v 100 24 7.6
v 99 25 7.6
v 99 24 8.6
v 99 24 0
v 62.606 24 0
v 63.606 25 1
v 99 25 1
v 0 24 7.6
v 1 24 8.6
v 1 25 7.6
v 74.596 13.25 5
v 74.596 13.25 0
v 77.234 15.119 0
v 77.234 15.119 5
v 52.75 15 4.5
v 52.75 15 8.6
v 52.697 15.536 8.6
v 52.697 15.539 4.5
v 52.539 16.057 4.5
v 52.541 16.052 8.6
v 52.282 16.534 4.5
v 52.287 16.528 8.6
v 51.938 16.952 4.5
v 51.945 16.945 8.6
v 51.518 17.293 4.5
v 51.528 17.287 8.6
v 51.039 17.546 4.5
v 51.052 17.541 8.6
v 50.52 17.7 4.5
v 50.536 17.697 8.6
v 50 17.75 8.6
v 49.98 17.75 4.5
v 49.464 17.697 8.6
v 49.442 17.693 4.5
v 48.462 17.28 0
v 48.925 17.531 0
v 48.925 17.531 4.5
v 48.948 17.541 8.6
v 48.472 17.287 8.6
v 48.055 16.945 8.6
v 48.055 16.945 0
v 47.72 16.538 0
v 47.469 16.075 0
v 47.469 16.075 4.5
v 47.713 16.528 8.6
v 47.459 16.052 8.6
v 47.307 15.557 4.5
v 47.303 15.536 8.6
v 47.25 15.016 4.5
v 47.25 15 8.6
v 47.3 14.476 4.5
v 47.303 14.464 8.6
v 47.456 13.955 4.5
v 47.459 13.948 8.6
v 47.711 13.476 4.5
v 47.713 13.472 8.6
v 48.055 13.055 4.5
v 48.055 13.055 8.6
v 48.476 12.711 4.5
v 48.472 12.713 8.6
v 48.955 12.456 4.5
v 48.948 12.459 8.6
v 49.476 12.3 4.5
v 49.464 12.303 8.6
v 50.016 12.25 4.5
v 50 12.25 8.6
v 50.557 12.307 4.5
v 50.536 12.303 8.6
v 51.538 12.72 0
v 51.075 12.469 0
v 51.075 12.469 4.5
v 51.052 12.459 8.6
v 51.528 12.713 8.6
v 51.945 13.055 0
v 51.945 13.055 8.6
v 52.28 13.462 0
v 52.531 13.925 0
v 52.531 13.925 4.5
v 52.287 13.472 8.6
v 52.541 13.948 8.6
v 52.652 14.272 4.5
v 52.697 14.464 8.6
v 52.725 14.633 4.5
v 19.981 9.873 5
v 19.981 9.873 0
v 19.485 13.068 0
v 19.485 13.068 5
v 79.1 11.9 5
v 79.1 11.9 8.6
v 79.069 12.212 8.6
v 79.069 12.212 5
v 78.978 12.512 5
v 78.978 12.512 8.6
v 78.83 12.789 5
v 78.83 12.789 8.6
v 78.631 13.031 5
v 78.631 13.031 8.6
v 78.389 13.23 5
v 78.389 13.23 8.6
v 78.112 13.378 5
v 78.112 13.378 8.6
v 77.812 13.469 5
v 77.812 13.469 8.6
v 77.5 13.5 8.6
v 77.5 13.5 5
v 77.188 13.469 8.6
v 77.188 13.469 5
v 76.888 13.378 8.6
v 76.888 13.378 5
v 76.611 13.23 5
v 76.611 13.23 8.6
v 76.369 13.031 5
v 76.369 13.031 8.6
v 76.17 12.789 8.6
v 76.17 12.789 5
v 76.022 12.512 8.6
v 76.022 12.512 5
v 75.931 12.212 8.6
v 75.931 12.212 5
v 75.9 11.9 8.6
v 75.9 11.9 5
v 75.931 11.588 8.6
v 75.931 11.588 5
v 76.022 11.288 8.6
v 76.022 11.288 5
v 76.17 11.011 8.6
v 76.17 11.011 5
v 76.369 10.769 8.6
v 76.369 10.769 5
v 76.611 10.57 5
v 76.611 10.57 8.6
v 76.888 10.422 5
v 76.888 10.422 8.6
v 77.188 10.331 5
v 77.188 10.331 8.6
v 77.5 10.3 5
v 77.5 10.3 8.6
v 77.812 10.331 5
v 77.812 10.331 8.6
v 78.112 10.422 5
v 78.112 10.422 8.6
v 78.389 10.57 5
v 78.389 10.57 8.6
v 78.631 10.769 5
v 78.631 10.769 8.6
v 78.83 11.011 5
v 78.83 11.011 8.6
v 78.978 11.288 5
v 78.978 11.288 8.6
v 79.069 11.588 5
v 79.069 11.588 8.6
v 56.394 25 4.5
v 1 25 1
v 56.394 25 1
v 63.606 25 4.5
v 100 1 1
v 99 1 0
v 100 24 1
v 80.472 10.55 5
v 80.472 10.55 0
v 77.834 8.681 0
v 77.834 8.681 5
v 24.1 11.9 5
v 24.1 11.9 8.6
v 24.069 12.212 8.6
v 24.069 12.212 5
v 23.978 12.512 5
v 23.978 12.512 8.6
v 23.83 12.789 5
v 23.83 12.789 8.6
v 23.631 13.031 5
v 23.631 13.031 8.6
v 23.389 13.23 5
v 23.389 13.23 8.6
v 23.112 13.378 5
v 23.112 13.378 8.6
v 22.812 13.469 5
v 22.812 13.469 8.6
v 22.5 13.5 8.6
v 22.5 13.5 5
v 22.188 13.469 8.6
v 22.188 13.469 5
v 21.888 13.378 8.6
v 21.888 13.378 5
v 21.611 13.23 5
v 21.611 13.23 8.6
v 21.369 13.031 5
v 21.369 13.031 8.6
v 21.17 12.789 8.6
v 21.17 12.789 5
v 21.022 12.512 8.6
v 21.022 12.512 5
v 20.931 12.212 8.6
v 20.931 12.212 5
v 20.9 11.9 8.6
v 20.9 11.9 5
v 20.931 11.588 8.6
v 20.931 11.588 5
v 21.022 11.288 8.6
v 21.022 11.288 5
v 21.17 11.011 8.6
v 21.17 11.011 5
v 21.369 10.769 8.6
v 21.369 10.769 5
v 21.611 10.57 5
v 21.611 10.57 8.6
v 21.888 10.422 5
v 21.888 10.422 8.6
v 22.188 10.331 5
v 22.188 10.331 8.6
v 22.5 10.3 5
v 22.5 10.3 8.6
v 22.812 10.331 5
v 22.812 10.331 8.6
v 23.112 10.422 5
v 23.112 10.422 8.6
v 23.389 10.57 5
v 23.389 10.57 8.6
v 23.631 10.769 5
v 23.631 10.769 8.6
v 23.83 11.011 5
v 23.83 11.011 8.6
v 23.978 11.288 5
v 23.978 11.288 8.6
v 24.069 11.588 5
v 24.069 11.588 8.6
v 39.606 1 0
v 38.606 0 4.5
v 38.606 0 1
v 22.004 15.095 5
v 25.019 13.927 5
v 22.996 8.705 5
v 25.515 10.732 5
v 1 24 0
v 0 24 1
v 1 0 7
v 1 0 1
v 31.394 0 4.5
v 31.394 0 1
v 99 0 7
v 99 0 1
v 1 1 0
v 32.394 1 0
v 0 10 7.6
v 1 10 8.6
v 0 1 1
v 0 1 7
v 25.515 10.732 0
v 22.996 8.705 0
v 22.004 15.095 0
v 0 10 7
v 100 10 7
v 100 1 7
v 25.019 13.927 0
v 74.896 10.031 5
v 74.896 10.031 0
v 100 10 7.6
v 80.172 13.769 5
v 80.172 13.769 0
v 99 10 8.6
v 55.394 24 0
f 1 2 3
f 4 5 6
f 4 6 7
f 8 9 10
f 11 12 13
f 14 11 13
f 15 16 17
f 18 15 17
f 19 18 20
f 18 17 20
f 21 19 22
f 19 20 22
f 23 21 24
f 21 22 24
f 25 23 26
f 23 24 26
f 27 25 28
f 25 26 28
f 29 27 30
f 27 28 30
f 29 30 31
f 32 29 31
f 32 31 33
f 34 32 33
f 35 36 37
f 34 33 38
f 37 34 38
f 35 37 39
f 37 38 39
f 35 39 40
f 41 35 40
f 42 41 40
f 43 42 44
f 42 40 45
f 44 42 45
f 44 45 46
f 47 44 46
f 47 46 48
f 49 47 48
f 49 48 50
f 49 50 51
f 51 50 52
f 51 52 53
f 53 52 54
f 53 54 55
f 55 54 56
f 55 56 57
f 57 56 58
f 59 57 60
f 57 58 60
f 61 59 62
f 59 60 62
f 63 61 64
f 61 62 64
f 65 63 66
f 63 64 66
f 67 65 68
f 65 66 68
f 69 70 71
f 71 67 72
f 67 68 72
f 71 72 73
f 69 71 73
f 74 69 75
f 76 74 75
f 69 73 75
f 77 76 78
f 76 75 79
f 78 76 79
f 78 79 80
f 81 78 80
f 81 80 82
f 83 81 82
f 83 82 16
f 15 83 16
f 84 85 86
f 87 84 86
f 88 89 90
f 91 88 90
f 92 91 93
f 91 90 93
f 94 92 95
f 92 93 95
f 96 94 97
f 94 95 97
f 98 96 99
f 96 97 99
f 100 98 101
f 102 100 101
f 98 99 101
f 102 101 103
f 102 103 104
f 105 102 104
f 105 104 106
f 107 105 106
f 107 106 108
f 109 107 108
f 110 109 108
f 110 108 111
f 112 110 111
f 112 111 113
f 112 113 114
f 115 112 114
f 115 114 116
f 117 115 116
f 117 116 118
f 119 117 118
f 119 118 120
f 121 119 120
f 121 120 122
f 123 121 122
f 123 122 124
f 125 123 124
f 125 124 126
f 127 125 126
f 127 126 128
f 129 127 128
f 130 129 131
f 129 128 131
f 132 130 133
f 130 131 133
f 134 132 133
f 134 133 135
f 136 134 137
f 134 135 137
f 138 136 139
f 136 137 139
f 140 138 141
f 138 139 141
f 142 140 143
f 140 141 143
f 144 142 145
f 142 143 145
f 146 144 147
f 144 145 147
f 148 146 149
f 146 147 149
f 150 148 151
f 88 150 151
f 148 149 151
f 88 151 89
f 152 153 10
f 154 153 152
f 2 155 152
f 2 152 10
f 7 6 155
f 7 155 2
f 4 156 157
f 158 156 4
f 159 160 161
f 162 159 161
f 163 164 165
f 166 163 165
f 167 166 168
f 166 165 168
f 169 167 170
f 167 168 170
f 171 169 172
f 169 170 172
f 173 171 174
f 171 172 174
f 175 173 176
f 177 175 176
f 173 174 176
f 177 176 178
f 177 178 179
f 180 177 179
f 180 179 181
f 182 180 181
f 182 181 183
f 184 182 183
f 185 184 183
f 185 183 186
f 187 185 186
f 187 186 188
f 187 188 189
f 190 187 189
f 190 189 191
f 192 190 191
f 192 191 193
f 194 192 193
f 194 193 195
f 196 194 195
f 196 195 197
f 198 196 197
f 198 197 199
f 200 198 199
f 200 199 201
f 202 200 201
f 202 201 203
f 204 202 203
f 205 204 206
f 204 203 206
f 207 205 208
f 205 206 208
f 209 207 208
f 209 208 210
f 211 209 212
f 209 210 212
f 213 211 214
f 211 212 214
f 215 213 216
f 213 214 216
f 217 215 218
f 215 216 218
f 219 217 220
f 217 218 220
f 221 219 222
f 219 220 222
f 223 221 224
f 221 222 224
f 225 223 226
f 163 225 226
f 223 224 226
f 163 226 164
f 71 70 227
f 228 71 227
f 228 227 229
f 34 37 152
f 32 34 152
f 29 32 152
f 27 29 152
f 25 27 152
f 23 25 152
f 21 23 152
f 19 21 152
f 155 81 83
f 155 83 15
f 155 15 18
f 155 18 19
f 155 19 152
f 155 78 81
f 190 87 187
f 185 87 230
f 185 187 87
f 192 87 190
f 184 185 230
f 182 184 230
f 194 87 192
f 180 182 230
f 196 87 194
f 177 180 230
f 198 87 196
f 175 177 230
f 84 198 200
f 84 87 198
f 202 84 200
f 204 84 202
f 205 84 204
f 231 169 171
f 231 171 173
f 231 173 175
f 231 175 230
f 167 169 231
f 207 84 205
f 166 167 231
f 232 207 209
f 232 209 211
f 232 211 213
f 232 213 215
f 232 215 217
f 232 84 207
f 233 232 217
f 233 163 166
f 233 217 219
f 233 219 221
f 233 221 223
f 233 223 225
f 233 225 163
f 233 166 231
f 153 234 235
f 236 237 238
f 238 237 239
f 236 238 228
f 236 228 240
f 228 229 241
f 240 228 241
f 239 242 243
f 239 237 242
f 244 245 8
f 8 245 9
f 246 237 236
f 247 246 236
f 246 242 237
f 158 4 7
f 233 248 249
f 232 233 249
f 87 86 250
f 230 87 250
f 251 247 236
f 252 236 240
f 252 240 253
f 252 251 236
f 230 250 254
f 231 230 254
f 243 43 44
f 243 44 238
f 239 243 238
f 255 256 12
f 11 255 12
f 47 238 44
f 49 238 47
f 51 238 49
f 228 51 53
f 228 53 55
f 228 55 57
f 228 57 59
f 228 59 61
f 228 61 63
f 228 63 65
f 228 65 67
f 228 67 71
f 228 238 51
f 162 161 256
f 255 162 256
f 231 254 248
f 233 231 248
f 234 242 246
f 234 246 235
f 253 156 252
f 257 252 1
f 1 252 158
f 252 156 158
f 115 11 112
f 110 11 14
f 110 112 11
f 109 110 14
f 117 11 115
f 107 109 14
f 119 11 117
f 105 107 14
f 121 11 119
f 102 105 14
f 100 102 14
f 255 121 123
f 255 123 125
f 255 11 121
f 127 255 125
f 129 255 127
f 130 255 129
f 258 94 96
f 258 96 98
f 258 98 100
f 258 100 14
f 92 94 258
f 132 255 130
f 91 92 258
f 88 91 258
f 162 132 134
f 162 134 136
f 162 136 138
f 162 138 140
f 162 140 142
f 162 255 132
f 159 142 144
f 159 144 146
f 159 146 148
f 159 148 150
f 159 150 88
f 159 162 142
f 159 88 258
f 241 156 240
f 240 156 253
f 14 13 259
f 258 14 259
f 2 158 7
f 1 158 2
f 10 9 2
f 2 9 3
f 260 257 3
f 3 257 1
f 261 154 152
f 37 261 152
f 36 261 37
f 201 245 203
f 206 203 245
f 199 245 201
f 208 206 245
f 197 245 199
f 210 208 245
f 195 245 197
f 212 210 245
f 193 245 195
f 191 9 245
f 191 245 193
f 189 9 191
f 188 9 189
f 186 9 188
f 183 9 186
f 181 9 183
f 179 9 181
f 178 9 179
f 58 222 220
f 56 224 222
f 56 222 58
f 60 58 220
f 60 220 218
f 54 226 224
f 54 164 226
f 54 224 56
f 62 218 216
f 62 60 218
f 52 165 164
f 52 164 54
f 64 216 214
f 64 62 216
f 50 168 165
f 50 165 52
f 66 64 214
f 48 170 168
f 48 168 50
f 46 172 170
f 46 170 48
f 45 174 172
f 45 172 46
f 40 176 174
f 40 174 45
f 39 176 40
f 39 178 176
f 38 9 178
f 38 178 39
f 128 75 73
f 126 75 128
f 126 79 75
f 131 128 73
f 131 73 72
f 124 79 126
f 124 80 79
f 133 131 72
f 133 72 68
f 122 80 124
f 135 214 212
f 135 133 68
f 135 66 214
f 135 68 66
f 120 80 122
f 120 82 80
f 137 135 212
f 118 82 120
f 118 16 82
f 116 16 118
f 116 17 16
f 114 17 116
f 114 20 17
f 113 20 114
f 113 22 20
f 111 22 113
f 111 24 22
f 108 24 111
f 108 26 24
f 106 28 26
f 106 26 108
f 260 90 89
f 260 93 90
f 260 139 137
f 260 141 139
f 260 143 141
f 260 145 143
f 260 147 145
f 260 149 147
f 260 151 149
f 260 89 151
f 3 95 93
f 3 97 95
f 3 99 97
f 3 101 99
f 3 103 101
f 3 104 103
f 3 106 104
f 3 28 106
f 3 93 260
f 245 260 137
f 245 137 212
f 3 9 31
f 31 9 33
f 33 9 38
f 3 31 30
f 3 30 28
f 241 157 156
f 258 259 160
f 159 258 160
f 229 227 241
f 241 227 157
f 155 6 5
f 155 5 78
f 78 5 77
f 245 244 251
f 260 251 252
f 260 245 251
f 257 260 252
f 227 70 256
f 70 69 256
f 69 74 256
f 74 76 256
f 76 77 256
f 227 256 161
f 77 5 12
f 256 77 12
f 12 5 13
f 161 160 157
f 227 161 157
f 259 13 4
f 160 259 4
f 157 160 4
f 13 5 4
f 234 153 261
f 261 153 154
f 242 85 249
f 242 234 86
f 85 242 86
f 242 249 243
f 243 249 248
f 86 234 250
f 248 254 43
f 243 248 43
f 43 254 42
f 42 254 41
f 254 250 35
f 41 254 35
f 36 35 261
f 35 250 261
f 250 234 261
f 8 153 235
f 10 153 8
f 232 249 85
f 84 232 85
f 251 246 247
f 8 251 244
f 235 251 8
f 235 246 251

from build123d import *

# Parameters (mm, degrees)
SKETCH_W        = 100
SKETCH_H        = 25
PAD_DEPTH       = 8.6
SKETCH001_W     = 111.182612
SKETCH001_H     = 13.535424
POCKET_DEPTH    = 1.6
SKETCH002_R     = 2.75
POCKET001_DEPTH = 8.601
POCKET002_DEPTH = 4.5
SKETCH004_R     = 1.6
POCKET003_DEPTH = 8.601
POCKET004_DEPTH = 5
CHAMFER_SIZE    = 1


with BuildPart() as part:
    # Sketch → Pad (new body)
    with BuildSketch(Plane.XY):
        with Locations((50, 12.5)):
            Rectangle(SKETCH_W, SKETCH_H)
    extrude(amount=PAD_DEPTH)

    # Sketch001 → Pocket (cut)
    with BuildSketch(Plane.XY.offset(8.6)):
        with Locations((49.408694, 3.232288)):
            Rectangle(SKETCH001_W, SKETCH001_H)
    extrude(amount=-POCKET_DEPTH, mode=Mode.SUBTRACT)

    # Sketch002 → Pocket001 (cut, through all)
    with BuildSketch(Plane.XY.offset(8.6)):
        with Locations((50, 15)):
            Circle(SKETCH002_R)
    extrude(amount=-POCKET001_DEPTH, mode=Mode.SUBTRACT)

    # Sketch003 → Pocket002 (cut)
    with BuildSketch(Plane(origin=(0, 0, 0), x_dir=(1, 0, 0), z_dir=(0, 0, -1))):
        with BuildLine():
            ThreePointArc((60.696878, -29.303122), (64.303122, -29.303122), (64.303122, -25.696878))
            Line((64.303122, -25.696878), (34.303122, 4.303122))
            ThreePointArc((34.303122, 4.303122), (30.696878, 4.303122), (30.696878, 0.696878))
            Line((60.696878, -29.303122), (30.696878, 0.696878))
        make_face()
    extrude(amount=-POCKET002_DEPTH, mode=Mode.SUBTRACT)

    # Sketch004 → Pocket003 (cut, through all)
    with BuildSketch(Plane.XY.offset(8.6)):
        with Locations((22.5, 11.9)):
            Circle(SKETCH004_R)
        with Locations((77.5, 11.9)):
            Circle(SKETCH004_R)
    extrude(amount=-POCKET003_DEPTH, mode=Mode.SUBTRACT)

    # Sketch005 → Pocket004 (cut)
    with BuildSketch(Plane(origin=(0, 0, 0), x_dir=(1, 0, 0), z_dir=(0, 0, -1))):
        Polygon((25.514905, -10.732231), (22.996135, -8.705132), (19.98123, -9.8729), (19.485095, -13.067769), (22.003865, -15.094868), (25.01877, -13.9271), align=None)
        Polygon((80.171675, -13.769283), (80.471515, -10.550055), (77.833501, -8.680772), (74.895648, -10.030717), (74.595808, -13.249945), (77.233822, -15.119228), align=None)
    extrude(amount=-POCKET004_DEPTH, mode=Mode.SUBTRACT)

    # Chamfer
    chamfer_edges = [part.edges().sort_by_distance(p)[0] for p in [
        (15.696878, 0, 0),
        (0, 12.5, 0),
        (28.196878, 25, 0),
        (81.803122, 25, 0),
        (69.303122, 0, 0),
        (100, 12.5, 0),
        (100, 25, 4.3),
        (50, 25, 8.6),
        (100, 17.5, 8.6),
        (100, 0, 3.5),
        (0, 0, 3.5),
        (0, 17.5, 8.6),
        (0, 25, 4.3),
    ]]
    chamfer(chamfer_edges, length=CHAMFER_SIZE)


solid = part.part
